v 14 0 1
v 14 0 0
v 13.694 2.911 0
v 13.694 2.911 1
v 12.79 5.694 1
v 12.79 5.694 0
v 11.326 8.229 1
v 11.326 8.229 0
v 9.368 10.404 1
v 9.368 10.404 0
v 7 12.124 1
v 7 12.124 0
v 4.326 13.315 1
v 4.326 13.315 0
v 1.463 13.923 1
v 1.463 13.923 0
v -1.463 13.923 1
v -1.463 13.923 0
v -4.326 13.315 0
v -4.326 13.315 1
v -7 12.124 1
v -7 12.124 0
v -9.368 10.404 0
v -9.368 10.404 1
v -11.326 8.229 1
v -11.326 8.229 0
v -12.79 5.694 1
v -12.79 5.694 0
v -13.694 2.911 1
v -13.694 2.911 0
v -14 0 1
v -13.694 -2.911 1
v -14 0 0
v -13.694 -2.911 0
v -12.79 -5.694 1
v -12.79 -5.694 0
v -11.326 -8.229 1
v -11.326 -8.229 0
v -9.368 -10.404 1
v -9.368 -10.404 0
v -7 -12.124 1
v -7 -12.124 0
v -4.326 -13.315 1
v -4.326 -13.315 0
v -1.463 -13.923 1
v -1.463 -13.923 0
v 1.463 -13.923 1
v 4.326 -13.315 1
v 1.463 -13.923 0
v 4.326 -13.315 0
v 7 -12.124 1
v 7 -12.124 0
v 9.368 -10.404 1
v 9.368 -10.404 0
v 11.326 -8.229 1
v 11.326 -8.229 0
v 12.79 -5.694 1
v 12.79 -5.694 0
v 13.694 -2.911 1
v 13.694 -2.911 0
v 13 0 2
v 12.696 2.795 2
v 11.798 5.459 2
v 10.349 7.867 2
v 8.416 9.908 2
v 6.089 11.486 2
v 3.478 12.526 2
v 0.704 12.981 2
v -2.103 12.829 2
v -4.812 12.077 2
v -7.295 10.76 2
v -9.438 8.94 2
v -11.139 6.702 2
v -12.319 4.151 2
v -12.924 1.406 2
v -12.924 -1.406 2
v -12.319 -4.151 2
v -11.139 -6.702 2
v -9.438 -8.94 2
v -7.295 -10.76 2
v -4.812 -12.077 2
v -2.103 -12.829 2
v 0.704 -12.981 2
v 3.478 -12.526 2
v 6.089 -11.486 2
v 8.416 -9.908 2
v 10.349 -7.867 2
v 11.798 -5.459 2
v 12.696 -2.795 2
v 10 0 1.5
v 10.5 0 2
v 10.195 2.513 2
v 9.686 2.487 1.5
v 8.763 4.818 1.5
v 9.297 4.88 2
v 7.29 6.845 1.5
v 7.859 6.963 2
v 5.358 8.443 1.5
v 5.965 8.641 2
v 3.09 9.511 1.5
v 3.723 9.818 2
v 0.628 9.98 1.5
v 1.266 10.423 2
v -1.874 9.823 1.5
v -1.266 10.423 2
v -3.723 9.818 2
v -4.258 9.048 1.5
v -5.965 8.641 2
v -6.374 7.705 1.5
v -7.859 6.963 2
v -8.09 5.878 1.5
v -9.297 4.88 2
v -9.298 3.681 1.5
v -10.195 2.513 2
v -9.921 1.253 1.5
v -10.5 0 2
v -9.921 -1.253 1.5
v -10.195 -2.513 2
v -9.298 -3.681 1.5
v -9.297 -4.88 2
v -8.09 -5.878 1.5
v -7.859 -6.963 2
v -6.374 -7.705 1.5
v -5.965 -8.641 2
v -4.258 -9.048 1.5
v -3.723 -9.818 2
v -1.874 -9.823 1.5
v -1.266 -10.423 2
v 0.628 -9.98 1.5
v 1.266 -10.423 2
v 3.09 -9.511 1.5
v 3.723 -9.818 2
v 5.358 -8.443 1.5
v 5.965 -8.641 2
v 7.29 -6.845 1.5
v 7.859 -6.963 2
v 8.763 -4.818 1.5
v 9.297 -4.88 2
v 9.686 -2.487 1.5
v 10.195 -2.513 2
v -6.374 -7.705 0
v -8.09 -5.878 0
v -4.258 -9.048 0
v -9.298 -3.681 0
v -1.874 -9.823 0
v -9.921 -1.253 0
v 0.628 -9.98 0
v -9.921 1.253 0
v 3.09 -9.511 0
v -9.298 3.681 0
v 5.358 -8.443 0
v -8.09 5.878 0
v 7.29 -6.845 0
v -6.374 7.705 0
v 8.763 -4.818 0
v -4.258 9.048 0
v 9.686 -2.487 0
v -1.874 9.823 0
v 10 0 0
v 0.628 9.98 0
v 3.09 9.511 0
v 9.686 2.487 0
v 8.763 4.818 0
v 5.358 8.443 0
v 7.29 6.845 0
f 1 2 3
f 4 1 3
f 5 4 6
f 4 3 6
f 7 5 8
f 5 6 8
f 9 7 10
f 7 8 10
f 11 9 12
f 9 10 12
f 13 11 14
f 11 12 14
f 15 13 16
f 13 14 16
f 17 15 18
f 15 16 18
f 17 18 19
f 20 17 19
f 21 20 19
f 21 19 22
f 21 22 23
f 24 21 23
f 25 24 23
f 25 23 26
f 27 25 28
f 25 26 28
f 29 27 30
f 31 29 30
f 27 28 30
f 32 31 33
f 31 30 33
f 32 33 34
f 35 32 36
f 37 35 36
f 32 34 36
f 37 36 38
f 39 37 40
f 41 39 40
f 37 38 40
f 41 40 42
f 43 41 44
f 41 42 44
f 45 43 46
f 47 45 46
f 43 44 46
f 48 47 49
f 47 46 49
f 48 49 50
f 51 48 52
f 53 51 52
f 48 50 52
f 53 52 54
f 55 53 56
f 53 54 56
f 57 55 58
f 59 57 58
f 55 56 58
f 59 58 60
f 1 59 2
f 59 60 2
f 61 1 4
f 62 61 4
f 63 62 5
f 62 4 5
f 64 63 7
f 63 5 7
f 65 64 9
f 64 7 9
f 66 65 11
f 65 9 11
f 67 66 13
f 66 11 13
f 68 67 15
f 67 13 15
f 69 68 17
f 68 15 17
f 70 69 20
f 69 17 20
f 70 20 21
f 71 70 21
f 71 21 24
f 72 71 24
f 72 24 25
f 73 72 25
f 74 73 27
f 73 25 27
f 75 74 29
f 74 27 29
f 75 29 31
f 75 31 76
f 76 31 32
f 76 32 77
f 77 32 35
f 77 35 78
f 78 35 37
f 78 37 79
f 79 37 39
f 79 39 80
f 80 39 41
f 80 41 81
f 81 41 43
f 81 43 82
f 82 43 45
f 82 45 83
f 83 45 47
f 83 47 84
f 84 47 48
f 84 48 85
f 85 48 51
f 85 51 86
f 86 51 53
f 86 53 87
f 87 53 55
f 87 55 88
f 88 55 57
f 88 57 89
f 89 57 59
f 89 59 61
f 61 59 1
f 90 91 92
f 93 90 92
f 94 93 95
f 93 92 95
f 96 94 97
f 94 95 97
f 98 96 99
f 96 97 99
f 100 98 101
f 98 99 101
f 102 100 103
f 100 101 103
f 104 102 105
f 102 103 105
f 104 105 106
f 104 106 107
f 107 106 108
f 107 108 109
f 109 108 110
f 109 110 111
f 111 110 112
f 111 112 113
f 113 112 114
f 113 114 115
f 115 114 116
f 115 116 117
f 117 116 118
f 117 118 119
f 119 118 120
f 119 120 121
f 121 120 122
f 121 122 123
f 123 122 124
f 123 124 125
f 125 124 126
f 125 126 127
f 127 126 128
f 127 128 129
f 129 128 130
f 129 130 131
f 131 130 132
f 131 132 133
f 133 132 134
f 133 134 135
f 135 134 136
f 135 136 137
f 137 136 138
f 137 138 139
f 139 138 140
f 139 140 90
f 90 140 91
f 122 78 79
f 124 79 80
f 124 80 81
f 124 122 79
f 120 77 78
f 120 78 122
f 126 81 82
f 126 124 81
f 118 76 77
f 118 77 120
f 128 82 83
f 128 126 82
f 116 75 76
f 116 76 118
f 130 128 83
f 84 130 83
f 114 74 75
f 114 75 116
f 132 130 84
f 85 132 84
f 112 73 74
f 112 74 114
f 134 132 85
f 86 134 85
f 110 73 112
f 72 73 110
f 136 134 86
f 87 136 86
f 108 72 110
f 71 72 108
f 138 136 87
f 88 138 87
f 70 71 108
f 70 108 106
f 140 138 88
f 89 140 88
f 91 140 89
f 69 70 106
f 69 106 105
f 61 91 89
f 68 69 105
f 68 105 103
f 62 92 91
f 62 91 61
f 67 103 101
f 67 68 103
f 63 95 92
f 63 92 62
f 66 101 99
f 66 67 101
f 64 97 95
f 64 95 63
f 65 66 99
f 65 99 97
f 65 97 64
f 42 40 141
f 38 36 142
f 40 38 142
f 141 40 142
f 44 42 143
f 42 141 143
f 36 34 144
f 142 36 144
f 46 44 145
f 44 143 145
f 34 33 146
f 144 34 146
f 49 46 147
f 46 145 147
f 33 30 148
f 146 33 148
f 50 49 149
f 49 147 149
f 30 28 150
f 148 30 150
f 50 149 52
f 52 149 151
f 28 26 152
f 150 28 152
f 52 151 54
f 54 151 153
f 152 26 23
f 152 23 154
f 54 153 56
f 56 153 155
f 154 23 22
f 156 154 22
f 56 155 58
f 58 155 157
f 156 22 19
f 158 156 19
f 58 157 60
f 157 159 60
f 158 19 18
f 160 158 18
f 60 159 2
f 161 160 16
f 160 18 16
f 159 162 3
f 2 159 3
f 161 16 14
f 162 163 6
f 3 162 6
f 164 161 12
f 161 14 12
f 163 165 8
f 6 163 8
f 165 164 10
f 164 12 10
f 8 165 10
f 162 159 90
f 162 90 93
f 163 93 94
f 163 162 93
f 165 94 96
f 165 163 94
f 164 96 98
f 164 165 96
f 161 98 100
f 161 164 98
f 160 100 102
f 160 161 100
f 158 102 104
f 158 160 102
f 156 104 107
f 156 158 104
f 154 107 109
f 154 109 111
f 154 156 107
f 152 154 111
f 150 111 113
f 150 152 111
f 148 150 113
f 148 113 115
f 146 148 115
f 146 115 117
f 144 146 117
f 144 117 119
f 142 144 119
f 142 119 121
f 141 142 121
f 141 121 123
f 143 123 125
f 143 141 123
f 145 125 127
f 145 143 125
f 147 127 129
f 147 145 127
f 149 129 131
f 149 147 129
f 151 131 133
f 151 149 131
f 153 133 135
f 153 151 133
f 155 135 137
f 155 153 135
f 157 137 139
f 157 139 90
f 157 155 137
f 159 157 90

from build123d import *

# Parameters (mm, degrees)
SKETCH_R        = 14
SKETCH_R_2      = 10
PAD_DEPTH       = 2
CHAMFER_SIZE    = 0.5
CHAMFER001_SIZE = 1


with BuildPart() as part:
    # Sketch → Pad (new body)
    with BuildSketch(Plane.XY):
        Circle(SKETCH_R)
        Circle(SKETCH_R_2, mode=Mode.SUBTRACT)
    extrude(amount=PAD_DEPTH)

    # Chamfer
    chamfer_edges = [part.edges().sort_by_distance(p)[0] for p in [
        (-10, 0, 2),
    ]]
    chamfer(chamfer_edges, length=CHAMFER_SIZE)

    # Chamfer001
    chamfer001_edges = [part.edges().sort_by_distance(p)[0] for p in [
        (-14, 0, 2),
    ]]
    chamfer(chamfer001_edges, length=CHAMFER001_SIZE)


solid = part.part
